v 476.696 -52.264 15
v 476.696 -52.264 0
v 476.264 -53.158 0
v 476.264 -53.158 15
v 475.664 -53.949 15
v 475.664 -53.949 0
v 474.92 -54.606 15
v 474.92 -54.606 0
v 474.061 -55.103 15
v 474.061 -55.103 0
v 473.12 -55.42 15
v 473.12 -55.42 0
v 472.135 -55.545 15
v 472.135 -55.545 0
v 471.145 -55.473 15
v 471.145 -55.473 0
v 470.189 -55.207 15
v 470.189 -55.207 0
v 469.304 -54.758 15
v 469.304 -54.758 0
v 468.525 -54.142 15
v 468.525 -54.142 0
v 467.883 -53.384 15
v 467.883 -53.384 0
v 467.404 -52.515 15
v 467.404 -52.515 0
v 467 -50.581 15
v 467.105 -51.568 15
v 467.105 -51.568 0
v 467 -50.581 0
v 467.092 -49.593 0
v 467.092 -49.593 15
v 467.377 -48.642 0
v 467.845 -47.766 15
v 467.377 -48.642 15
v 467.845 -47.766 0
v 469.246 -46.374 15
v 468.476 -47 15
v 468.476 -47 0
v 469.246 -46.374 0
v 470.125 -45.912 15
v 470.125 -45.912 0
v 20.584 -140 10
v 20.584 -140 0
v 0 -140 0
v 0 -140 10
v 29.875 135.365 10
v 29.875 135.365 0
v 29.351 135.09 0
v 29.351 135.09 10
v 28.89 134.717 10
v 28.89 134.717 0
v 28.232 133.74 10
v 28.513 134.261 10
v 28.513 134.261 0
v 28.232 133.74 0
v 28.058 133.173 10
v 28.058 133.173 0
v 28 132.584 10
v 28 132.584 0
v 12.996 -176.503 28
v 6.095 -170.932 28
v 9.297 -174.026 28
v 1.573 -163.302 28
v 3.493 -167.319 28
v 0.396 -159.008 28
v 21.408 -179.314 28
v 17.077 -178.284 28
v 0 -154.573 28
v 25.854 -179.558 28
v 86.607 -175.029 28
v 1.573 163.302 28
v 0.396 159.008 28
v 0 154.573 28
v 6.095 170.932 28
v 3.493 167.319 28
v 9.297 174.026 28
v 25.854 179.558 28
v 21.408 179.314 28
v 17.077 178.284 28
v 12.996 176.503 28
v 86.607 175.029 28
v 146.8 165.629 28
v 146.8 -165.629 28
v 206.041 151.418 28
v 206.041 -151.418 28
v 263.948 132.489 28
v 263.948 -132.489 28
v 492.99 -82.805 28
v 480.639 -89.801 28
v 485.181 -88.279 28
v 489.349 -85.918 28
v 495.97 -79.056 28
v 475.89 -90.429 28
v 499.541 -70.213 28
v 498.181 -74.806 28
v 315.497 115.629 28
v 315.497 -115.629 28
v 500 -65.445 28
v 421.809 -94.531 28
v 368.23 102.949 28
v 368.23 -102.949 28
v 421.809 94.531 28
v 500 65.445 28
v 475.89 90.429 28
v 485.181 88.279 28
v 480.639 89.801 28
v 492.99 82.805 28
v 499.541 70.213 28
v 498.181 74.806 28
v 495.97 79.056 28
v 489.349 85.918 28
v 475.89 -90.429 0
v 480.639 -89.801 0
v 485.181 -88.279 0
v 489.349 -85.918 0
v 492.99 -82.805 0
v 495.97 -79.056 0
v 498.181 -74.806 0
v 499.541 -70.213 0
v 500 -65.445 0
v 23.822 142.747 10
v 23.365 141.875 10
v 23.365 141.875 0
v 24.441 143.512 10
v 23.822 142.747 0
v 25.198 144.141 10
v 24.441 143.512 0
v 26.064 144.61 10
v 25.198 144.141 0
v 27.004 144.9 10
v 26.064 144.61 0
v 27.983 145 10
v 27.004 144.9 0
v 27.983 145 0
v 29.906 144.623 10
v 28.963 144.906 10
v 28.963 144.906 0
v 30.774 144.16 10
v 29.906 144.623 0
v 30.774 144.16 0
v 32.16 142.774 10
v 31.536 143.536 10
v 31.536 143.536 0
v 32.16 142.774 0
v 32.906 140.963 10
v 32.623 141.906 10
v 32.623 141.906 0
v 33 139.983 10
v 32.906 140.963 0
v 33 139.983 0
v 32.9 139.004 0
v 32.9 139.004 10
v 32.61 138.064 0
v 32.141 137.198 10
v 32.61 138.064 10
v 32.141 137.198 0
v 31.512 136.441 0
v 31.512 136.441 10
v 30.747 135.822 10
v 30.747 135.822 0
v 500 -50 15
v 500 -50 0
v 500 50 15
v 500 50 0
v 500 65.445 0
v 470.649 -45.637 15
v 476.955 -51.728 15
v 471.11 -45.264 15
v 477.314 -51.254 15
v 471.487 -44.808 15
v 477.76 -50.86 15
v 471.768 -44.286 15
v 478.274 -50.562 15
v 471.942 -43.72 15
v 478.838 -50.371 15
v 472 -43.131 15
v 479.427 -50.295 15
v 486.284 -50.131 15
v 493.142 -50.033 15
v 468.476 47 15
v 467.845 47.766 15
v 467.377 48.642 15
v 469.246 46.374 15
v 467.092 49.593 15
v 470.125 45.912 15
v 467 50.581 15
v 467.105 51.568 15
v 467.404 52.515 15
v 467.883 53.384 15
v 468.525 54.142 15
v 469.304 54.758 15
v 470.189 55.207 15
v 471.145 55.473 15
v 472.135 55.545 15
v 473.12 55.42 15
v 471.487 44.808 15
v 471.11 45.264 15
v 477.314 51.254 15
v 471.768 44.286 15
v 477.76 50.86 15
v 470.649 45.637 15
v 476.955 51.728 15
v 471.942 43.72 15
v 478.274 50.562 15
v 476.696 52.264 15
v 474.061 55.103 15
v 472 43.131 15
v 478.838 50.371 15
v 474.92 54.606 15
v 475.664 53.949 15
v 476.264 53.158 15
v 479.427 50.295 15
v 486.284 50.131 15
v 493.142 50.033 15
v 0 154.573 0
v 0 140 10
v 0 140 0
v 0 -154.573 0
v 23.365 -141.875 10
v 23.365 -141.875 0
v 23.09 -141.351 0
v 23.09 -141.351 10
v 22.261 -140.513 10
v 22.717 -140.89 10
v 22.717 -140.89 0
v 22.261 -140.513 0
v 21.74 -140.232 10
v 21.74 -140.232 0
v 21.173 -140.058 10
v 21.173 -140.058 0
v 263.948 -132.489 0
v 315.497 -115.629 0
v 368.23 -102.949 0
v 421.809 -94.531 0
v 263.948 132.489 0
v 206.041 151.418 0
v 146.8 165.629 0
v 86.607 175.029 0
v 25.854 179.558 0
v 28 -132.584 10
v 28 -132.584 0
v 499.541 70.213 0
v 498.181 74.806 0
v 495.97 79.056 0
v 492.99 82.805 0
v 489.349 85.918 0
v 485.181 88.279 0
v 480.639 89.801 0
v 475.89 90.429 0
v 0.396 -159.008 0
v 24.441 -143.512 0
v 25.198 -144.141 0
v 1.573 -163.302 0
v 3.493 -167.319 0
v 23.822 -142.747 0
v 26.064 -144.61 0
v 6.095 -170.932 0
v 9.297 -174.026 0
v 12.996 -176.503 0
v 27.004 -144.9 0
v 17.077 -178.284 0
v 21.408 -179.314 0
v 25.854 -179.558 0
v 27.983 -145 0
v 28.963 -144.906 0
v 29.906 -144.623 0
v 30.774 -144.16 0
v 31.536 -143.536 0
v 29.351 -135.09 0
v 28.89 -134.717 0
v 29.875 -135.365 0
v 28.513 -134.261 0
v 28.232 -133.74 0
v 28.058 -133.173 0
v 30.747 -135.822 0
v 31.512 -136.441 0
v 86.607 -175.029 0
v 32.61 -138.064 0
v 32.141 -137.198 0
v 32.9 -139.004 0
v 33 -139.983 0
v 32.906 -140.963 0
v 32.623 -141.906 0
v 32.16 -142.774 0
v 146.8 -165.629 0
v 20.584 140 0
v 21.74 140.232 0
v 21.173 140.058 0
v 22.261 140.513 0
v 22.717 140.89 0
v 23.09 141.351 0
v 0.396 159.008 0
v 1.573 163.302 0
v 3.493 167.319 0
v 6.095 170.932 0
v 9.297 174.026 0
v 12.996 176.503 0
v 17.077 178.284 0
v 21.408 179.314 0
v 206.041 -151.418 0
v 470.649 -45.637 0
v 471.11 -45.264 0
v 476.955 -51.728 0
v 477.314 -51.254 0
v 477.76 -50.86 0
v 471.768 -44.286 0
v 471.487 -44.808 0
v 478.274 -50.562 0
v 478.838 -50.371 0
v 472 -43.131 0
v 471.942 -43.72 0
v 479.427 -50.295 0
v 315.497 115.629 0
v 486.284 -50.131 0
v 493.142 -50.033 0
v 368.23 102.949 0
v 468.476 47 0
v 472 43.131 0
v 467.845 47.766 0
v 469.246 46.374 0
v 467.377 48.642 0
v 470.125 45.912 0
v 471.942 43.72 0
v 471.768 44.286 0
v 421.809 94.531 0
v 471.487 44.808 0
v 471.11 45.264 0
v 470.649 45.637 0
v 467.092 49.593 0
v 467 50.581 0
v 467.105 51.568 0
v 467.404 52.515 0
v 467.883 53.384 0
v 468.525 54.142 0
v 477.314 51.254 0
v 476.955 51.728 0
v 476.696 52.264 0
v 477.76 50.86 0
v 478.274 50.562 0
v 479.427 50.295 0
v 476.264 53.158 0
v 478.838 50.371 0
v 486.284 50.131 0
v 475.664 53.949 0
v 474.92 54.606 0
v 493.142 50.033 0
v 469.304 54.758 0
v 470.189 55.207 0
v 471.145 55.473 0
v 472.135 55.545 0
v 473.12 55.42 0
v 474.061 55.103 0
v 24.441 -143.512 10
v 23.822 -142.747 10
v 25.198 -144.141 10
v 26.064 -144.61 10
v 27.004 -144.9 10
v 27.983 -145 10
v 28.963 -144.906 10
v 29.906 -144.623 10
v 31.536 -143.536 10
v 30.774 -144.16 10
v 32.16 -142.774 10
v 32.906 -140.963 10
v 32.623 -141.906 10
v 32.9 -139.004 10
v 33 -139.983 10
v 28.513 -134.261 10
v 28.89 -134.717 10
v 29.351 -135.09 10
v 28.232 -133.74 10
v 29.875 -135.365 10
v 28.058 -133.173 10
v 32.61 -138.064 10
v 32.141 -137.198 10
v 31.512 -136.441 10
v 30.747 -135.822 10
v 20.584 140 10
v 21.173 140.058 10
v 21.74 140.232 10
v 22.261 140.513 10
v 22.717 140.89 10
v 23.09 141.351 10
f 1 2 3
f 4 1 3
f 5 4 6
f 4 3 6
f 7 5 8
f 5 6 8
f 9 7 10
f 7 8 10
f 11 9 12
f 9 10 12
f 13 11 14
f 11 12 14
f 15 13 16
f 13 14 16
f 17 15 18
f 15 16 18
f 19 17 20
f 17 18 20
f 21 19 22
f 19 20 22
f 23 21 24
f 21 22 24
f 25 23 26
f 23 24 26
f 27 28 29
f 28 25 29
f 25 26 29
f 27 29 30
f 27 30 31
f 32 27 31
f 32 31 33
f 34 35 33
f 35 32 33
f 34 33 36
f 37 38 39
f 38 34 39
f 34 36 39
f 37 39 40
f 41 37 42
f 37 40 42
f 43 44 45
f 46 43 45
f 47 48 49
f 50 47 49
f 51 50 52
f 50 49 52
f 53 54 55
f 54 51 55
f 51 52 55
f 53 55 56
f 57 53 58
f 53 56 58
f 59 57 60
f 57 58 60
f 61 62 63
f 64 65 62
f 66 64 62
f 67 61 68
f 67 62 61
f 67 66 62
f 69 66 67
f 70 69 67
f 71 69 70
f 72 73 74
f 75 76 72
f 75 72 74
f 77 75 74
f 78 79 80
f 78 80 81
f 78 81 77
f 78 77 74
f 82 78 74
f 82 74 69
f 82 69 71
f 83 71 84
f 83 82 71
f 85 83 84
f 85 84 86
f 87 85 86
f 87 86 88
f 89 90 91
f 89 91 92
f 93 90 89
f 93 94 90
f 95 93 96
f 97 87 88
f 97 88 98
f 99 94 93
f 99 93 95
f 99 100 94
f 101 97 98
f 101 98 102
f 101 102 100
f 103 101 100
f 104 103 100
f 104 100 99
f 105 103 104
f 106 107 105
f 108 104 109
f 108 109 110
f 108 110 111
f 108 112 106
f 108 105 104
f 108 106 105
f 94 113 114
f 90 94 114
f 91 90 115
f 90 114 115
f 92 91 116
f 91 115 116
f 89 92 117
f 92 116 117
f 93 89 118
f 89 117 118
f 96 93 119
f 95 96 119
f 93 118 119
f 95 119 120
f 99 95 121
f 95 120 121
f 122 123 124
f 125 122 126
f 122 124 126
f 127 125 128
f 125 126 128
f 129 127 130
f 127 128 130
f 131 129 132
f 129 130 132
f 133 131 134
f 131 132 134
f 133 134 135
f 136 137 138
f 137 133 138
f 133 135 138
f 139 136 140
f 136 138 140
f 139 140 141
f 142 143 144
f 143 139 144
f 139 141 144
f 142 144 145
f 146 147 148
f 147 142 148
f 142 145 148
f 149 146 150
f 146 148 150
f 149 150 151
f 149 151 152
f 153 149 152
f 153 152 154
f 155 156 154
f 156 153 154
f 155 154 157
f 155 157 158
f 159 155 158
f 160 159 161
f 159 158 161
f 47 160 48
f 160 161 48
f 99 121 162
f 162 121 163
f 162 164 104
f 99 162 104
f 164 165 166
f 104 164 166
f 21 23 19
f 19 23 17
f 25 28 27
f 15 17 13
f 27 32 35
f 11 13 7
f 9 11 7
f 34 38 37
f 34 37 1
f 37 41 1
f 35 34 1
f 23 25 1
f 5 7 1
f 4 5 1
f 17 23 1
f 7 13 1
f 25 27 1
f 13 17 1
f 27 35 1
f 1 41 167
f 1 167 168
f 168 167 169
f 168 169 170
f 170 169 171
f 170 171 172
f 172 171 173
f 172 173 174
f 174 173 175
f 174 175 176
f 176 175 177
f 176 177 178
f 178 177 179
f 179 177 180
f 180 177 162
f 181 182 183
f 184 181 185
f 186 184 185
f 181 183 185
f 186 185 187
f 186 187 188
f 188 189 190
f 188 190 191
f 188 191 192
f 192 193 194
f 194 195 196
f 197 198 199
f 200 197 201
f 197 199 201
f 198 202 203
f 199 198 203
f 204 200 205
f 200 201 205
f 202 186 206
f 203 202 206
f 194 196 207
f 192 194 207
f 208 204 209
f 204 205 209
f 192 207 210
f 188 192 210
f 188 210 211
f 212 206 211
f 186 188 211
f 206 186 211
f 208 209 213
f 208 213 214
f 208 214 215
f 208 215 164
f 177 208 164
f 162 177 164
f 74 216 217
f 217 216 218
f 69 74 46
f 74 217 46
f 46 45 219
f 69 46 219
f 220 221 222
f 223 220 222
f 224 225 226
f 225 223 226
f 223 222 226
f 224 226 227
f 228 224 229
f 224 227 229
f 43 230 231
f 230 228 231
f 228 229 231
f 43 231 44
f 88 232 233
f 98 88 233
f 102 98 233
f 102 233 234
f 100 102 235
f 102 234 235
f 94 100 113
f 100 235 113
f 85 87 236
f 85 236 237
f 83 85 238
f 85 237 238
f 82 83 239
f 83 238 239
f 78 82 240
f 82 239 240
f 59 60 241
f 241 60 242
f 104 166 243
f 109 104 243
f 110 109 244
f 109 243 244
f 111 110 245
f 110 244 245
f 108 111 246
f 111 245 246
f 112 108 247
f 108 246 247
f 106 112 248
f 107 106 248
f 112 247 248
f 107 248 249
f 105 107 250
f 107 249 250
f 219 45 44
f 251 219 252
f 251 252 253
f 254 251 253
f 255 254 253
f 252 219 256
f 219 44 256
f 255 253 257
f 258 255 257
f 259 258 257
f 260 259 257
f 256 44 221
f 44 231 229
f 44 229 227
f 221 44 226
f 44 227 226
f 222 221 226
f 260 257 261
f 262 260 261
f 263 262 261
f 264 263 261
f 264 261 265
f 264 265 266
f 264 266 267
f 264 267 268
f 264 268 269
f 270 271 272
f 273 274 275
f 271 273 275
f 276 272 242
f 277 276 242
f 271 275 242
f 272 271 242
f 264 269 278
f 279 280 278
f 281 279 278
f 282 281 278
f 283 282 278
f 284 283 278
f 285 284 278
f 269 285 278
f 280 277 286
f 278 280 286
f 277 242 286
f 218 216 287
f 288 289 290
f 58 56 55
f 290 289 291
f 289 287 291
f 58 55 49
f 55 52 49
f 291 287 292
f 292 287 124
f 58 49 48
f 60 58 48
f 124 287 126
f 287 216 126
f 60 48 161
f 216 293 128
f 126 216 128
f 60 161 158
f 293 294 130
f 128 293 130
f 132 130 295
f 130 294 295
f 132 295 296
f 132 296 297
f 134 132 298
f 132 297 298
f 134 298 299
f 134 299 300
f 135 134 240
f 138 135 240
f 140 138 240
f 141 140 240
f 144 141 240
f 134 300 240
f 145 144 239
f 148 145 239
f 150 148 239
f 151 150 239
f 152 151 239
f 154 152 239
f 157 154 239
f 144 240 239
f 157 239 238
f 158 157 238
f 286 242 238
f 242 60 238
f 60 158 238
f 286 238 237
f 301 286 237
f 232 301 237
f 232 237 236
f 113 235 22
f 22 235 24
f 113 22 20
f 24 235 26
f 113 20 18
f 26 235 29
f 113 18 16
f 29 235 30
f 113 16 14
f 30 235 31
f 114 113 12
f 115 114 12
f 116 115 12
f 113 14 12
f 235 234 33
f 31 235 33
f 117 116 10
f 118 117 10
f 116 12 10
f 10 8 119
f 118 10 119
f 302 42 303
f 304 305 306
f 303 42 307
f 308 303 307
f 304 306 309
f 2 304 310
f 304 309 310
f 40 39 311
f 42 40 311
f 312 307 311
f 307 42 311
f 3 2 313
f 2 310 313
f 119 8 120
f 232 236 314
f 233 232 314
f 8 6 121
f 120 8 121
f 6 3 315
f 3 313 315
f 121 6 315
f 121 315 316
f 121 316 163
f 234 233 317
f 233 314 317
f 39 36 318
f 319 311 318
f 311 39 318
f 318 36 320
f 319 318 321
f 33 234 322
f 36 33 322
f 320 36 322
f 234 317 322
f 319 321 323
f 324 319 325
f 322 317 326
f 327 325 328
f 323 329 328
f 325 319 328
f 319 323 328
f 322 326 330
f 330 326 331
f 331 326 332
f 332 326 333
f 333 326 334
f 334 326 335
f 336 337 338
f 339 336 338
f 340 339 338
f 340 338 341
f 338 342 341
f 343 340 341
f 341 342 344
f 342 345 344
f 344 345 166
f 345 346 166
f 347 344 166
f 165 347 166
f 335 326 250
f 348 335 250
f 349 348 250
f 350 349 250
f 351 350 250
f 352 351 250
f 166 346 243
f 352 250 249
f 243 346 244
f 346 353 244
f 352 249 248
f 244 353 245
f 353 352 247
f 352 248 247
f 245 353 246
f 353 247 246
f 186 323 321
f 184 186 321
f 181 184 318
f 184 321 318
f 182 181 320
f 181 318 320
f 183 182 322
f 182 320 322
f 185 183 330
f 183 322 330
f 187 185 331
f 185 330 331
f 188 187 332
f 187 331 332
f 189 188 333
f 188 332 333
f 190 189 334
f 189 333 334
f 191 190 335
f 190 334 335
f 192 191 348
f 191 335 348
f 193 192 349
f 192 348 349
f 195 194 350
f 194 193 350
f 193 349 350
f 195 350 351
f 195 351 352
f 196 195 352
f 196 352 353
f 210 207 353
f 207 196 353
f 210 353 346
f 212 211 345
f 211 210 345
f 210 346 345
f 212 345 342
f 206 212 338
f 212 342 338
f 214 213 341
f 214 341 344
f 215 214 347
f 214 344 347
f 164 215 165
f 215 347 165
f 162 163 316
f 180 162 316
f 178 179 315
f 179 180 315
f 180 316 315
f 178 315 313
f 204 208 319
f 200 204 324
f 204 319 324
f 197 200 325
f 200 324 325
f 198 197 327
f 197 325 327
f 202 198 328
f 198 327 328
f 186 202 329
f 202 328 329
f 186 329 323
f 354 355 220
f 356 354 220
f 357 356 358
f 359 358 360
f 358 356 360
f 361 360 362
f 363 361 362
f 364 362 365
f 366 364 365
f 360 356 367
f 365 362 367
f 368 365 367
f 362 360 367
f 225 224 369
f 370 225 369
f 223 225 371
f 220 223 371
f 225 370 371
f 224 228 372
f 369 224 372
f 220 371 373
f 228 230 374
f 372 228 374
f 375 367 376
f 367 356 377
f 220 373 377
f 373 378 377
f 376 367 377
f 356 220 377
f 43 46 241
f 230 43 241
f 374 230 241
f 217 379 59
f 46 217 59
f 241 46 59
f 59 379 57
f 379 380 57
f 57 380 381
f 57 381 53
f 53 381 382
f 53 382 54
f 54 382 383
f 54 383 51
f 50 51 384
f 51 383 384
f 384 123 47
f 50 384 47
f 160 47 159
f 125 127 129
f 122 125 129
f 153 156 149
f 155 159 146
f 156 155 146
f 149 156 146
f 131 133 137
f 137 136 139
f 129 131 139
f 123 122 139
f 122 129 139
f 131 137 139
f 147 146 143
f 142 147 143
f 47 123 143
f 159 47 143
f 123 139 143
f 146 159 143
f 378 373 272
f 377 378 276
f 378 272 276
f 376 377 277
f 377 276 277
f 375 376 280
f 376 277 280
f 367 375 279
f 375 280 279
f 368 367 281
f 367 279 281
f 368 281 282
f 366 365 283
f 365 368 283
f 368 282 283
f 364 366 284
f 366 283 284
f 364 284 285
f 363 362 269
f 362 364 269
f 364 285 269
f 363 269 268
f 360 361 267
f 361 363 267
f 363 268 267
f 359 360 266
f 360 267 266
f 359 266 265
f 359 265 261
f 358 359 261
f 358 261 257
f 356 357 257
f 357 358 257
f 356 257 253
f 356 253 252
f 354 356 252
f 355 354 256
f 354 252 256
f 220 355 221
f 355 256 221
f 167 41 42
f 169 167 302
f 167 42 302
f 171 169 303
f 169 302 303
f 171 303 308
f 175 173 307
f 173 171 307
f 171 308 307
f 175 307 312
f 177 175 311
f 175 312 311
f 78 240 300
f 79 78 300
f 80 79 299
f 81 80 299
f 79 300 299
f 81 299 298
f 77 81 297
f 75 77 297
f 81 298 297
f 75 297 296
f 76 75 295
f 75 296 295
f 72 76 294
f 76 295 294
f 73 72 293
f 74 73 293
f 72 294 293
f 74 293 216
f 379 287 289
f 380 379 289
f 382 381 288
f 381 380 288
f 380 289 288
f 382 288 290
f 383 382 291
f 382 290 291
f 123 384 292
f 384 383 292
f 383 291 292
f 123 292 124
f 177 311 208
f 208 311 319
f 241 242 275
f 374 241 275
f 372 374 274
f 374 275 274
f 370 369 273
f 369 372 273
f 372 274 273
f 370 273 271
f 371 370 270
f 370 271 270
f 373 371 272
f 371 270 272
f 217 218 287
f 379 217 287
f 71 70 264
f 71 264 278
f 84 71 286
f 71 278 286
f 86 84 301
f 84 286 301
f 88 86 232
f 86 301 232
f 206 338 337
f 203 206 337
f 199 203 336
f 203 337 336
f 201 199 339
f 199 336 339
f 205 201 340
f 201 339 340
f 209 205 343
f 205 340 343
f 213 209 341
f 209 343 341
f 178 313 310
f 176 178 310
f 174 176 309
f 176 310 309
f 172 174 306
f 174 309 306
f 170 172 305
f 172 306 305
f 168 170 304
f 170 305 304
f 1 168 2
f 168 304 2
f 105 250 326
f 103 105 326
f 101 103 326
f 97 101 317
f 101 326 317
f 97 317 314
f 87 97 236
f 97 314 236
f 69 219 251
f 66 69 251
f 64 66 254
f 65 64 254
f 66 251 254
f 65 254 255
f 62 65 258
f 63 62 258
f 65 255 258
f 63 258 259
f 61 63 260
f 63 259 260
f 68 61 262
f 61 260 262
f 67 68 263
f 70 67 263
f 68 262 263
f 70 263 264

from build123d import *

# Parameters (mm, degrees)
F1_DEPTH = 28
F2_START = 10
F2_DEPTH = 18
F3_START = 15
F3_DEPTH = 13


with BuildPart() as f1:
    # F0 (on Top) → F1 (new body)
    with BuildSketch(Plane.XY):
        with BuildLine():
            ThreePointArc((475.8903838544, 90.4294724937), (368.2302608049, 102.9485734508), (263.9480821387, 132.489345215))
            ThreePointArc((263.9480821387, 132.489345215), (146.799756159, 165.6285981358), (25.853889943, 179.5583436206))
            ThreePointArc((25.853889943, 179.5583436206), (7.6268489987, 172.5499609003), (0, 154.5729304368))
            Line((0, 154.5729304368), (0, 140))
            Line((0, 140), (20.5838015129, 140))
            ThreePointArc((20.5838015129, 140), (22.260852496, 140.5125314072), (23.3648759456, 141.875))
            ThreePointArc((23.3648759456, 141.875), (31.5355339059, 143.5355339059), (29.875, 135.3648759456))
            ThreePointArc((29.875, 135.3648759456), (28.5125314072, 134.260852496), (28, 132.5838015129))
            Line((28, 132.5838015129), (28, 128.9779645573))
            Line((28, 128.9779645573), (28, -128.9779645573))
            Line((28, -128.9779645573), (28, -132.5838015129))
            ThreePointArc((28, -132.5838015129), (28.5125314072, -134.260852496), (29.875, -135.3648759456))
            ThreePointArc((29.875, -135.3648759456), (31.5355339059, -143.5355339059), (23.3648759456, -141.875))
            ThreePointArc((23.3648759456, -141.875), (22.260852496, -140.5125314072), (20.5838015129, -140))
            Line((20.5838015129, -140), (0, -140))
            Line((0, -140), (0, -154.5729304368))
            ThreePointArc((0, -154.5729304368), (7.6268489987, -172.5499609003), (25.853889943, -179.5583436206))
            ThreePointArc((25.853889943, -179.5583436206), (146.799756159, -165.6285981358), (263.9480821387, -132.489345215))
            ThreePointArc((263.9480821387, -132.489345215), (368.2302608049, -102.9485734508), (475.8903838544, -90.4294724937))
            ThreePointArc((475.8903838544, -90.4294724937), (492.989713677, -82.8053505266), (500, -65.445333193))
            Line((500, -65.445333193), (500, -50))
            ThreePointArc((500, -50), (489.712690089, -50.0738092009), (479.4274983284, -50.2952216062))
            ThreePointArc((479.4274983284, -50.2952216062), (477.7595252441, -50.8602066094), (476.6959890071, -52.2638564719))
            ThreePointArc((476.6959890071, -52.2638564719), (468.5248750874, -54.1419014019), (470.125, -45.9118494147))
            ThreePointArc((470.125, -45.9118494147), (471.4874685928, -44.8078259652), (472, -43.1307749821))
            Line((472, -43.1307749821), (472, -40.993877733))
            Line((472, -40.993877733), (472, 40.993877733))
            Line((472, 40.993877733), (472, 43.1307749821))
            ThreePointArc((472, 43.1307749821), (471.4874685928, 44.8078259652), (470.125, 45.9118494147))
            ThreePointArc((470.125, 45.9118494147), (468.5248750874, 54.1419014019), (476.6959890071, 52.2638564719))
            ThreePointArc((476.6959890071, 52.2638564719), (477.7595252441, 50.8602066094), (479.4274983284, 50.2952216062))
            ThreePointArc((479.4274983284, 50.2952216062), (489.712690089, 50.0738092009), (500, 50))
            Line((500, 50), (500, 65.445333193))
            ThreePointArc((500, 65.445333193), (492.989713677, 82.8053505266), (475.8903838544, 90.4294724937))
        make_face()
    extrude(amount=F1_DEPTH)

    # F0 (on Top) → F2 (join)
    with BuildSketch(Plane.XY.offset(F2_START)):
        with BuildLine():
            Line((20.5838015129, 140), (0, 140))
            Line((0, 140), (0, -140))
            Line((0, -140), (20.5838015129, -140))
            ThreePointArc((20.5838015129, -140), (22.260852496, -140.5125314072), (23.3648759456, -141.875))
            ThreePointArc((23.3648759456, -141.875), (31.5355339059, -143.5355339059), (29.875, -135.3648759456))
            ThreePointArc((29.875, -135.3648759456), (28.5125314072, -134.260852496), (28, -132.5838015129))
            Line((28, -132.5838015129), (28, -128.9779645573))
            Line((28, -128.9779645573), (28, 128.9779645573))
            Line((28, 128.9779645573), (28, 132.5838015129))
            ThreePointArc((28, 132.5838015129), (28.5125314072, 134.260852496), (29.875, 135.3648759456))
            ThreePointArc((29.875, 135.3648759456), (31.5355339059, 143.5355339059), (23.3648759456, 141.875))
            ThreePointArc((23.3648759456, 141.875), (22.260852496, 140.5125314072), (20.5838015129, 140))
        make_face()
    extrude(amount=F2_DEPTH)

    # F0 (on Top) → F3 (join)
    with BuildSketch(Plane.XY.offset(F3_START)):
        with BuildLine():
            Line((500, -50), (500, 50))
            ThreePointArc((500, 50), (489.712690089, 50.0738092009), (479.4274983284, 50.2952216062))
            ThreePointArc((479.4274983284, 50.2952216062), (477.7595252441, 50.8602066094), (476.6959890071, 52.2638564719))
            ThreePointArc((476.6959890071, 52.2638564719), (468.5248750874, 54.1419014019), (470.125, 45.9118494147))
            ThreePointArc((470.125, 45.9118494147), (471.4874685928, 44.8078259652), (472, 43.1307749821))
            Line((472, 43.1307749821), (472, 40.993877733))
            Line((472, 40.993877733), (472, -40.993877733))
            Line((472, -40.993877733), (472, -43.1307749821))
            ThreePointArc((472, -43.1307749821), (471.4874685928, -44.8078259652), (470.125, -45.9118494147))
            ThreePointArc((470.125, -45.9118494147), (468.5248750874, -54.1419014019), (476.6959890071, -52.2638564719))
            ThreePointArc((476.6959890071, -52.2638564719), (477.7595252441, -50.8602066094), (479.4274983284, -50.2952216062))
            ThreePointArc((479.4274983284, -50.2952216062), (489.712690089, -50.0738092009), (500, -50))
        make_face()
    extrude(amount=F3_DEPTH)


solid = f1.part
